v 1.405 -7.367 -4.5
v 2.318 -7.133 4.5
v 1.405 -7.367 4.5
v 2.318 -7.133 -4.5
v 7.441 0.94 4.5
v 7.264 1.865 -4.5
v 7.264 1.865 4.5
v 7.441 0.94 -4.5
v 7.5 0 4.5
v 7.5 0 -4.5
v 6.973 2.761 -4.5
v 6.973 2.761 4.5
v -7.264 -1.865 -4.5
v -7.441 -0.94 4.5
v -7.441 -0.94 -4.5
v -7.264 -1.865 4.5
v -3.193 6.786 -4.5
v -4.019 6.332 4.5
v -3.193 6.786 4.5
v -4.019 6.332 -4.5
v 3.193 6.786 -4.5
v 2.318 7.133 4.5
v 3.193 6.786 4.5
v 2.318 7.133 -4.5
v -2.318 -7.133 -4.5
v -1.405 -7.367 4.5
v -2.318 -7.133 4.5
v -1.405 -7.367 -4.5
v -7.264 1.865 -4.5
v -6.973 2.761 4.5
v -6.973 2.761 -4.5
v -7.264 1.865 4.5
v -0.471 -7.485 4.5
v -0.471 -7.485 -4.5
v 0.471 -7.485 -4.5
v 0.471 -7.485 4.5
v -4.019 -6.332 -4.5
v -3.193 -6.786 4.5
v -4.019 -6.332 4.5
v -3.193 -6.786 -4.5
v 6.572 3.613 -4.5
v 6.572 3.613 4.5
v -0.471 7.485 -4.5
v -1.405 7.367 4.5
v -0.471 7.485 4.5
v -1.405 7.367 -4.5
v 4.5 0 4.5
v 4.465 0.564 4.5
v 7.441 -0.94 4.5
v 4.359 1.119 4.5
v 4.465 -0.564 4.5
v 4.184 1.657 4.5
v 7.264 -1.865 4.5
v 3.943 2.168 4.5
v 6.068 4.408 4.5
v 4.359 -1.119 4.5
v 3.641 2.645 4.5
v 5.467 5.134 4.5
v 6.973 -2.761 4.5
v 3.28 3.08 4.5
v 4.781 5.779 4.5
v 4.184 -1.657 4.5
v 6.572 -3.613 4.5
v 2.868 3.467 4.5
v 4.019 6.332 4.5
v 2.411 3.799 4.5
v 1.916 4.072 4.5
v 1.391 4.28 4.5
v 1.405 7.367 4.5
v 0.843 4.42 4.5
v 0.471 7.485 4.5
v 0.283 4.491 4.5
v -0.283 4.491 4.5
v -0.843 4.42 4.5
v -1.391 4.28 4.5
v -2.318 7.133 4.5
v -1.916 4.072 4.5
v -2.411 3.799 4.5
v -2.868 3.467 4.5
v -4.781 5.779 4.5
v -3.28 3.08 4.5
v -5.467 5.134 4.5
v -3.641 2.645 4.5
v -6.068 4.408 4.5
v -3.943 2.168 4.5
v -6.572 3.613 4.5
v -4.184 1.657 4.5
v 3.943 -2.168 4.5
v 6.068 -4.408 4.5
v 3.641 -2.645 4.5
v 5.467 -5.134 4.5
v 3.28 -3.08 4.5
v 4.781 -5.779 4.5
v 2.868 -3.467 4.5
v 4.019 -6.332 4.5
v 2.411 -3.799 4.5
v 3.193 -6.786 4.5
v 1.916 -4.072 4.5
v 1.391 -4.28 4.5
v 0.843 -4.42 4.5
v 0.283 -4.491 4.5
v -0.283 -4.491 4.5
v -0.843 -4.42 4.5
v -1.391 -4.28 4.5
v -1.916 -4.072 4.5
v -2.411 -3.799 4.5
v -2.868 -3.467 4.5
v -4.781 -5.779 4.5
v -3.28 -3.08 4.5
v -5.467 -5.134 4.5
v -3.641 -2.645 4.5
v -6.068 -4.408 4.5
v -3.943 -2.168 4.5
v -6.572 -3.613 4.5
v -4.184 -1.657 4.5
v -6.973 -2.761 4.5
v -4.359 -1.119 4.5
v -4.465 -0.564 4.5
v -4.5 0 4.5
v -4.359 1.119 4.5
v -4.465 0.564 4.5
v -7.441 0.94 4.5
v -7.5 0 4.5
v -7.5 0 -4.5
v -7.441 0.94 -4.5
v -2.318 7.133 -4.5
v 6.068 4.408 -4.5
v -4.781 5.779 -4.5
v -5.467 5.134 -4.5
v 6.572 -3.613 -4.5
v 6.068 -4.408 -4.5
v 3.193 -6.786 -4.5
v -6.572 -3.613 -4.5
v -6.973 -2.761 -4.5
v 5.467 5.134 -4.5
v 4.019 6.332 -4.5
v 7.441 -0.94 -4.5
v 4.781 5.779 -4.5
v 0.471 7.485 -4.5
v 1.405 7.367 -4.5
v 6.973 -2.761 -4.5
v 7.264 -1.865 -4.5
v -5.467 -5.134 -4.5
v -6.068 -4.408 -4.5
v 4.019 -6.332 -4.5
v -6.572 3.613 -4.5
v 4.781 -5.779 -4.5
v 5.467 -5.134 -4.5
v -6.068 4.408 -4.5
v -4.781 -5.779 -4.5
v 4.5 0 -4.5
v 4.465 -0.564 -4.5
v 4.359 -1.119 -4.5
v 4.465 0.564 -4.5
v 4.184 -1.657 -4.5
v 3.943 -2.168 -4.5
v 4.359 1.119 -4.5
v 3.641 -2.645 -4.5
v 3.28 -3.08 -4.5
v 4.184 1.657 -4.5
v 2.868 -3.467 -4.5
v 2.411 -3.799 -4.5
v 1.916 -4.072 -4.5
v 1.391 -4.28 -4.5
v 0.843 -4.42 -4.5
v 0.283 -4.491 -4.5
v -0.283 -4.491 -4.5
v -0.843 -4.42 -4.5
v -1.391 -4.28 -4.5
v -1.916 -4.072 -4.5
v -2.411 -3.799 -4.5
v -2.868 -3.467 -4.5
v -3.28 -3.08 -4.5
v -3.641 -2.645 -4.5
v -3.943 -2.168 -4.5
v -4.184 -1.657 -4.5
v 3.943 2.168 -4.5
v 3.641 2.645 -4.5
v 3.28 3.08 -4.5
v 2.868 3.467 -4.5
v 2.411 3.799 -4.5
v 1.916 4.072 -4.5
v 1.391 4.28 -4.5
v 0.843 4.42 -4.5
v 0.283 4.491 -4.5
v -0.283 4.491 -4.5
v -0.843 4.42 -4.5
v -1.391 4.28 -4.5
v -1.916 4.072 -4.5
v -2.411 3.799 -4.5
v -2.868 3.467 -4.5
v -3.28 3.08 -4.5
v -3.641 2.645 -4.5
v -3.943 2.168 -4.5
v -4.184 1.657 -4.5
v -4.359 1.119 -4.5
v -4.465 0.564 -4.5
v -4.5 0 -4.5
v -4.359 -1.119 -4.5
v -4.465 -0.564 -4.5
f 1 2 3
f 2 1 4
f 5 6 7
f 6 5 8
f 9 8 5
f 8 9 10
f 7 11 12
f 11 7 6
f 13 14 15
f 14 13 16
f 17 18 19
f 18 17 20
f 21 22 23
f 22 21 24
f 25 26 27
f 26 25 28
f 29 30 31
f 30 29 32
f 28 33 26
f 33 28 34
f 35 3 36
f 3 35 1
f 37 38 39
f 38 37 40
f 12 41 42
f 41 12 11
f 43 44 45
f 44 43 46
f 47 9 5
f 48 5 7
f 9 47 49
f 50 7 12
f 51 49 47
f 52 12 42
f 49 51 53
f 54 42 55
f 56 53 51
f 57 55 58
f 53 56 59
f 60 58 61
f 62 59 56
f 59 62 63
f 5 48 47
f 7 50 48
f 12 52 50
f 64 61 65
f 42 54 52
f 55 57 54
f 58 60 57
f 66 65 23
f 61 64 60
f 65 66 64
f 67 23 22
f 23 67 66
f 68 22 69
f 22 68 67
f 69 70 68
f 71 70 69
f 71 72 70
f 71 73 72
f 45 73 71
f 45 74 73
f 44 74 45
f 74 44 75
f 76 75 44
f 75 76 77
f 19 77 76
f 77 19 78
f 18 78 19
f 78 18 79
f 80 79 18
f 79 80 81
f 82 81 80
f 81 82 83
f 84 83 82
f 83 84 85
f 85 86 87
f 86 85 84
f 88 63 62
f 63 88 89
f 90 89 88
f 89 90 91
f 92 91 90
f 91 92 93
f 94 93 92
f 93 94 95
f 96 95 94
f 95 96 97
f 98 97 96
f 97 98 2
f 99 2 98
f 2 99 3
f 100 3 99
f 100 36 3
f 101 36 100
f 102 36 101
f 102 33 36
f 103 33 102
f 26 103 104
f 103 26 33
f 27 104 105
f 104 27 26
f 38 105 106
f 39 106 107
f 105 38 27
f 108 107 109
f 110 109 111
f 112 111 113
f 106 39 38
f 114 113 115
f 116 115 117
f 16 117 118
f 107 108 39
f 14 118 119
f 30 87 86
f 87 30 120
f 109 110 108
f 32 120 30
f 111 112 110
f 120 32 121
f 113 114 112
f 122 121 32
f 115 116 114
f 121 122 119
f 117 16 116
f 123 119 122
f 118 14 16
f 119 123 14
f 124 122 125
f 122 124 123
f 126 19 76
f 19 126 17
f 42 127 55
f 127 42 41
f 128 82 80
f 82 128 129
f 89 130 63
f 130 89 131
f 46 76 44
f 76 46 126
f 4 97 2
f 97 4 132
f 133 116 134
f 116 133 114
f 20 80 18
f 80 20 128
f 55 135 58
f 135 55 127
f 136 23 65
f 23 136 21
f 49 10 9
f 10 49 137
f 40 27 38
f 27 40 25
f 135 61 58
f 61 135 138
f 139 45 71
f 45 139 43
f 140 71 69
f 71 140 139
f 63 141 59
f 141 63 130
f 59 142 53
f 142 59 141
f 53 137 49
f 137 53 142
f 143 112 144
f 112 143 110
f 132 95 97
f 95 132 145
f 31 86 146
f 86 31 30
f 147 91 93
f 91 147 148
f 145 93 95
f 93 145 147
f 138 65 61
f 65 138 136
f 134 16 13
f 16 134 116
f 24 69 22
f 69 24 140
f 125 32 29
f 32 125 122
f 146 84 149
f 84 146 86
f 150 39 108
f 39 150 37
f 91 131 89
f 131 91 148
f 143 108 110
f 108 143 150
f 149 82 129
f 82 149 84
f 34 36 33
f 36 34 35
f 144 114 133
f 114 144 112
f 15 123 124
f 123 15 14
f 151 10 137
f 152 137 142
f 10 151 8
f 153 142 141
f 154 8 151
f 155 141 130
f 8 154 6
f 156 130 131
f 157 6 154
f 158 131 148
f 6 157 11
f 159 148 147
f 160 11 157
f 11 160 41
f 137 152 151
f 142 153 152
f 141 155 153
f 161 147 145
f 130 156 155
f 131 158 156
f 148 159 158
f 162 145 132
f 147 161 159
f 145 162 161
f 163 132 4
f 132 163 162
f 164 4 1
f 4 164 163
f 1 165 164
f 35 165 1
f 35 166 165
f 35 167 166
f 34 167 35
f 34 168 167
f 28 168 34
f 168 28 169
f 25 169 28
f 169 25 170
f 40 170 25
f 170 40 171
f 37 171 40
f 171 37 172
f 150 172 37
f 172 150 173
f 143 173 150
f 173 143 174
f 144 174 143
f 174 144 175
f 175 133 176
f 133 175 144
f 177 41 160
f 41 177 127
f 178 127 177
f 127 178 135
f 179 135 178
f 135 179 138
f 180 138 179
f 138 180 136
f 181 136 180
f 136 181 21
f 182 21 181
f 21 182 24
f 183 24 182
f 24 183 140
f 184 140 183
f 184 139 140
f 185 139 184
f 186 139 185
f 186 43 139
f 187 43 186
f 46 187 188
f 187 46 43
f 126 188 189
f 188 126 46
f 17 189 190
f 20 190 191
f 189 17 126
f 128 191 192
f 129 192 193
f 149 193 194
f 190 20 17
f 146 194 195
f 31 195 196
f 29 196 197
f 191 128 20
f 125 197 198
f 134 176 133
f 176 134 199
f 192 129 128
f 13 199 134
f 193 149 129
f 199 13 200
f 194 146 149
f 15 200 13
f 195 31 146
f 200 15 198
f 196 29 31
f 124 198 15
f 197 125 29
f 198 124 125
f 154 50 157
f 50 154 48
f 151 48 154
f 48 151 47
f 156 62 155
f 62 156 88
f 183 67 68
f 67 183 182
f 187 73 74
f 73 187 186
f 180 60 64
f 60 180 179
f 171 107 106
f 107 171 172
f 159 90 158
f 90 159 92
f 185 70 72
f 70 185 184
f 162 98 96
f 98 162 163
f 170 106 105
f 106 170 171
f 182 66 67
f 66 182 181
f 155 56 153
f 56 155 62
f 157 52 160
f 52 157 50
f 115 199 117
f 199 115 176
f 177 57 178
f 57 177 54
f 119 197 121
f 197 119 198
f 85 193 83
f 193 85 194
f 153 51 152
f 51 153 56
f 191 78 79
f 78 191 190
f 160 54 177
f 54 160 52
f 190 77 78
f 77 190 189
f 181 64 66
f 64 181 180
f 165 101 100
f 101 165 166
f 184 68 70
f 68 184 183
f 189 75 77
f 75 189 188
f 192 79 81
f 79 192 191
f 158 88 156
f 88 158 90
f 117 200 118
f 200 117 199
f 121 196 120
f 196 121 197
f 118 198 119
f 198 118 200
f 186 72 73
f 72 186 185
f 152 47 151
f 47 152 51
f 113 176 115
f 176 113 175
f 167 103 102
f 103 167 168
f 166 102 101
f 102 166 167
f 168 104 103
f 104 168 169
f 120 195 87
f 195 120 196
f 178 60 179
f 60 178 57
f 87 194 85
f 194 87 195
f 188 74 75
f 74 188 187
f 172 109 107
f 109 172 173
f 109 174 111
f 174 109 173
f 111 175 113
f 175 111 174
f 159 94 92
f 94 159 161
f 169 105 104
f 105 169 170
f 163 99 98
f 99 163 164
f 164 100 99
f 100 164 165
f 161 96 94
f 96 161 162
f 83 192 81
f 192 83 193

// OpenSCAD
$fn = 50;


difference() {
	union() {
		translate(v = [0, 0, -4.5000000000]) {
			cylinder(h = 9, r = 7.5000000000);
		}
	}
	union() {
		translate(v = [0, 0, -100.0000000000]) {
			cylinder(h = 200, r = 4.5000000000);
		}
	}
}
